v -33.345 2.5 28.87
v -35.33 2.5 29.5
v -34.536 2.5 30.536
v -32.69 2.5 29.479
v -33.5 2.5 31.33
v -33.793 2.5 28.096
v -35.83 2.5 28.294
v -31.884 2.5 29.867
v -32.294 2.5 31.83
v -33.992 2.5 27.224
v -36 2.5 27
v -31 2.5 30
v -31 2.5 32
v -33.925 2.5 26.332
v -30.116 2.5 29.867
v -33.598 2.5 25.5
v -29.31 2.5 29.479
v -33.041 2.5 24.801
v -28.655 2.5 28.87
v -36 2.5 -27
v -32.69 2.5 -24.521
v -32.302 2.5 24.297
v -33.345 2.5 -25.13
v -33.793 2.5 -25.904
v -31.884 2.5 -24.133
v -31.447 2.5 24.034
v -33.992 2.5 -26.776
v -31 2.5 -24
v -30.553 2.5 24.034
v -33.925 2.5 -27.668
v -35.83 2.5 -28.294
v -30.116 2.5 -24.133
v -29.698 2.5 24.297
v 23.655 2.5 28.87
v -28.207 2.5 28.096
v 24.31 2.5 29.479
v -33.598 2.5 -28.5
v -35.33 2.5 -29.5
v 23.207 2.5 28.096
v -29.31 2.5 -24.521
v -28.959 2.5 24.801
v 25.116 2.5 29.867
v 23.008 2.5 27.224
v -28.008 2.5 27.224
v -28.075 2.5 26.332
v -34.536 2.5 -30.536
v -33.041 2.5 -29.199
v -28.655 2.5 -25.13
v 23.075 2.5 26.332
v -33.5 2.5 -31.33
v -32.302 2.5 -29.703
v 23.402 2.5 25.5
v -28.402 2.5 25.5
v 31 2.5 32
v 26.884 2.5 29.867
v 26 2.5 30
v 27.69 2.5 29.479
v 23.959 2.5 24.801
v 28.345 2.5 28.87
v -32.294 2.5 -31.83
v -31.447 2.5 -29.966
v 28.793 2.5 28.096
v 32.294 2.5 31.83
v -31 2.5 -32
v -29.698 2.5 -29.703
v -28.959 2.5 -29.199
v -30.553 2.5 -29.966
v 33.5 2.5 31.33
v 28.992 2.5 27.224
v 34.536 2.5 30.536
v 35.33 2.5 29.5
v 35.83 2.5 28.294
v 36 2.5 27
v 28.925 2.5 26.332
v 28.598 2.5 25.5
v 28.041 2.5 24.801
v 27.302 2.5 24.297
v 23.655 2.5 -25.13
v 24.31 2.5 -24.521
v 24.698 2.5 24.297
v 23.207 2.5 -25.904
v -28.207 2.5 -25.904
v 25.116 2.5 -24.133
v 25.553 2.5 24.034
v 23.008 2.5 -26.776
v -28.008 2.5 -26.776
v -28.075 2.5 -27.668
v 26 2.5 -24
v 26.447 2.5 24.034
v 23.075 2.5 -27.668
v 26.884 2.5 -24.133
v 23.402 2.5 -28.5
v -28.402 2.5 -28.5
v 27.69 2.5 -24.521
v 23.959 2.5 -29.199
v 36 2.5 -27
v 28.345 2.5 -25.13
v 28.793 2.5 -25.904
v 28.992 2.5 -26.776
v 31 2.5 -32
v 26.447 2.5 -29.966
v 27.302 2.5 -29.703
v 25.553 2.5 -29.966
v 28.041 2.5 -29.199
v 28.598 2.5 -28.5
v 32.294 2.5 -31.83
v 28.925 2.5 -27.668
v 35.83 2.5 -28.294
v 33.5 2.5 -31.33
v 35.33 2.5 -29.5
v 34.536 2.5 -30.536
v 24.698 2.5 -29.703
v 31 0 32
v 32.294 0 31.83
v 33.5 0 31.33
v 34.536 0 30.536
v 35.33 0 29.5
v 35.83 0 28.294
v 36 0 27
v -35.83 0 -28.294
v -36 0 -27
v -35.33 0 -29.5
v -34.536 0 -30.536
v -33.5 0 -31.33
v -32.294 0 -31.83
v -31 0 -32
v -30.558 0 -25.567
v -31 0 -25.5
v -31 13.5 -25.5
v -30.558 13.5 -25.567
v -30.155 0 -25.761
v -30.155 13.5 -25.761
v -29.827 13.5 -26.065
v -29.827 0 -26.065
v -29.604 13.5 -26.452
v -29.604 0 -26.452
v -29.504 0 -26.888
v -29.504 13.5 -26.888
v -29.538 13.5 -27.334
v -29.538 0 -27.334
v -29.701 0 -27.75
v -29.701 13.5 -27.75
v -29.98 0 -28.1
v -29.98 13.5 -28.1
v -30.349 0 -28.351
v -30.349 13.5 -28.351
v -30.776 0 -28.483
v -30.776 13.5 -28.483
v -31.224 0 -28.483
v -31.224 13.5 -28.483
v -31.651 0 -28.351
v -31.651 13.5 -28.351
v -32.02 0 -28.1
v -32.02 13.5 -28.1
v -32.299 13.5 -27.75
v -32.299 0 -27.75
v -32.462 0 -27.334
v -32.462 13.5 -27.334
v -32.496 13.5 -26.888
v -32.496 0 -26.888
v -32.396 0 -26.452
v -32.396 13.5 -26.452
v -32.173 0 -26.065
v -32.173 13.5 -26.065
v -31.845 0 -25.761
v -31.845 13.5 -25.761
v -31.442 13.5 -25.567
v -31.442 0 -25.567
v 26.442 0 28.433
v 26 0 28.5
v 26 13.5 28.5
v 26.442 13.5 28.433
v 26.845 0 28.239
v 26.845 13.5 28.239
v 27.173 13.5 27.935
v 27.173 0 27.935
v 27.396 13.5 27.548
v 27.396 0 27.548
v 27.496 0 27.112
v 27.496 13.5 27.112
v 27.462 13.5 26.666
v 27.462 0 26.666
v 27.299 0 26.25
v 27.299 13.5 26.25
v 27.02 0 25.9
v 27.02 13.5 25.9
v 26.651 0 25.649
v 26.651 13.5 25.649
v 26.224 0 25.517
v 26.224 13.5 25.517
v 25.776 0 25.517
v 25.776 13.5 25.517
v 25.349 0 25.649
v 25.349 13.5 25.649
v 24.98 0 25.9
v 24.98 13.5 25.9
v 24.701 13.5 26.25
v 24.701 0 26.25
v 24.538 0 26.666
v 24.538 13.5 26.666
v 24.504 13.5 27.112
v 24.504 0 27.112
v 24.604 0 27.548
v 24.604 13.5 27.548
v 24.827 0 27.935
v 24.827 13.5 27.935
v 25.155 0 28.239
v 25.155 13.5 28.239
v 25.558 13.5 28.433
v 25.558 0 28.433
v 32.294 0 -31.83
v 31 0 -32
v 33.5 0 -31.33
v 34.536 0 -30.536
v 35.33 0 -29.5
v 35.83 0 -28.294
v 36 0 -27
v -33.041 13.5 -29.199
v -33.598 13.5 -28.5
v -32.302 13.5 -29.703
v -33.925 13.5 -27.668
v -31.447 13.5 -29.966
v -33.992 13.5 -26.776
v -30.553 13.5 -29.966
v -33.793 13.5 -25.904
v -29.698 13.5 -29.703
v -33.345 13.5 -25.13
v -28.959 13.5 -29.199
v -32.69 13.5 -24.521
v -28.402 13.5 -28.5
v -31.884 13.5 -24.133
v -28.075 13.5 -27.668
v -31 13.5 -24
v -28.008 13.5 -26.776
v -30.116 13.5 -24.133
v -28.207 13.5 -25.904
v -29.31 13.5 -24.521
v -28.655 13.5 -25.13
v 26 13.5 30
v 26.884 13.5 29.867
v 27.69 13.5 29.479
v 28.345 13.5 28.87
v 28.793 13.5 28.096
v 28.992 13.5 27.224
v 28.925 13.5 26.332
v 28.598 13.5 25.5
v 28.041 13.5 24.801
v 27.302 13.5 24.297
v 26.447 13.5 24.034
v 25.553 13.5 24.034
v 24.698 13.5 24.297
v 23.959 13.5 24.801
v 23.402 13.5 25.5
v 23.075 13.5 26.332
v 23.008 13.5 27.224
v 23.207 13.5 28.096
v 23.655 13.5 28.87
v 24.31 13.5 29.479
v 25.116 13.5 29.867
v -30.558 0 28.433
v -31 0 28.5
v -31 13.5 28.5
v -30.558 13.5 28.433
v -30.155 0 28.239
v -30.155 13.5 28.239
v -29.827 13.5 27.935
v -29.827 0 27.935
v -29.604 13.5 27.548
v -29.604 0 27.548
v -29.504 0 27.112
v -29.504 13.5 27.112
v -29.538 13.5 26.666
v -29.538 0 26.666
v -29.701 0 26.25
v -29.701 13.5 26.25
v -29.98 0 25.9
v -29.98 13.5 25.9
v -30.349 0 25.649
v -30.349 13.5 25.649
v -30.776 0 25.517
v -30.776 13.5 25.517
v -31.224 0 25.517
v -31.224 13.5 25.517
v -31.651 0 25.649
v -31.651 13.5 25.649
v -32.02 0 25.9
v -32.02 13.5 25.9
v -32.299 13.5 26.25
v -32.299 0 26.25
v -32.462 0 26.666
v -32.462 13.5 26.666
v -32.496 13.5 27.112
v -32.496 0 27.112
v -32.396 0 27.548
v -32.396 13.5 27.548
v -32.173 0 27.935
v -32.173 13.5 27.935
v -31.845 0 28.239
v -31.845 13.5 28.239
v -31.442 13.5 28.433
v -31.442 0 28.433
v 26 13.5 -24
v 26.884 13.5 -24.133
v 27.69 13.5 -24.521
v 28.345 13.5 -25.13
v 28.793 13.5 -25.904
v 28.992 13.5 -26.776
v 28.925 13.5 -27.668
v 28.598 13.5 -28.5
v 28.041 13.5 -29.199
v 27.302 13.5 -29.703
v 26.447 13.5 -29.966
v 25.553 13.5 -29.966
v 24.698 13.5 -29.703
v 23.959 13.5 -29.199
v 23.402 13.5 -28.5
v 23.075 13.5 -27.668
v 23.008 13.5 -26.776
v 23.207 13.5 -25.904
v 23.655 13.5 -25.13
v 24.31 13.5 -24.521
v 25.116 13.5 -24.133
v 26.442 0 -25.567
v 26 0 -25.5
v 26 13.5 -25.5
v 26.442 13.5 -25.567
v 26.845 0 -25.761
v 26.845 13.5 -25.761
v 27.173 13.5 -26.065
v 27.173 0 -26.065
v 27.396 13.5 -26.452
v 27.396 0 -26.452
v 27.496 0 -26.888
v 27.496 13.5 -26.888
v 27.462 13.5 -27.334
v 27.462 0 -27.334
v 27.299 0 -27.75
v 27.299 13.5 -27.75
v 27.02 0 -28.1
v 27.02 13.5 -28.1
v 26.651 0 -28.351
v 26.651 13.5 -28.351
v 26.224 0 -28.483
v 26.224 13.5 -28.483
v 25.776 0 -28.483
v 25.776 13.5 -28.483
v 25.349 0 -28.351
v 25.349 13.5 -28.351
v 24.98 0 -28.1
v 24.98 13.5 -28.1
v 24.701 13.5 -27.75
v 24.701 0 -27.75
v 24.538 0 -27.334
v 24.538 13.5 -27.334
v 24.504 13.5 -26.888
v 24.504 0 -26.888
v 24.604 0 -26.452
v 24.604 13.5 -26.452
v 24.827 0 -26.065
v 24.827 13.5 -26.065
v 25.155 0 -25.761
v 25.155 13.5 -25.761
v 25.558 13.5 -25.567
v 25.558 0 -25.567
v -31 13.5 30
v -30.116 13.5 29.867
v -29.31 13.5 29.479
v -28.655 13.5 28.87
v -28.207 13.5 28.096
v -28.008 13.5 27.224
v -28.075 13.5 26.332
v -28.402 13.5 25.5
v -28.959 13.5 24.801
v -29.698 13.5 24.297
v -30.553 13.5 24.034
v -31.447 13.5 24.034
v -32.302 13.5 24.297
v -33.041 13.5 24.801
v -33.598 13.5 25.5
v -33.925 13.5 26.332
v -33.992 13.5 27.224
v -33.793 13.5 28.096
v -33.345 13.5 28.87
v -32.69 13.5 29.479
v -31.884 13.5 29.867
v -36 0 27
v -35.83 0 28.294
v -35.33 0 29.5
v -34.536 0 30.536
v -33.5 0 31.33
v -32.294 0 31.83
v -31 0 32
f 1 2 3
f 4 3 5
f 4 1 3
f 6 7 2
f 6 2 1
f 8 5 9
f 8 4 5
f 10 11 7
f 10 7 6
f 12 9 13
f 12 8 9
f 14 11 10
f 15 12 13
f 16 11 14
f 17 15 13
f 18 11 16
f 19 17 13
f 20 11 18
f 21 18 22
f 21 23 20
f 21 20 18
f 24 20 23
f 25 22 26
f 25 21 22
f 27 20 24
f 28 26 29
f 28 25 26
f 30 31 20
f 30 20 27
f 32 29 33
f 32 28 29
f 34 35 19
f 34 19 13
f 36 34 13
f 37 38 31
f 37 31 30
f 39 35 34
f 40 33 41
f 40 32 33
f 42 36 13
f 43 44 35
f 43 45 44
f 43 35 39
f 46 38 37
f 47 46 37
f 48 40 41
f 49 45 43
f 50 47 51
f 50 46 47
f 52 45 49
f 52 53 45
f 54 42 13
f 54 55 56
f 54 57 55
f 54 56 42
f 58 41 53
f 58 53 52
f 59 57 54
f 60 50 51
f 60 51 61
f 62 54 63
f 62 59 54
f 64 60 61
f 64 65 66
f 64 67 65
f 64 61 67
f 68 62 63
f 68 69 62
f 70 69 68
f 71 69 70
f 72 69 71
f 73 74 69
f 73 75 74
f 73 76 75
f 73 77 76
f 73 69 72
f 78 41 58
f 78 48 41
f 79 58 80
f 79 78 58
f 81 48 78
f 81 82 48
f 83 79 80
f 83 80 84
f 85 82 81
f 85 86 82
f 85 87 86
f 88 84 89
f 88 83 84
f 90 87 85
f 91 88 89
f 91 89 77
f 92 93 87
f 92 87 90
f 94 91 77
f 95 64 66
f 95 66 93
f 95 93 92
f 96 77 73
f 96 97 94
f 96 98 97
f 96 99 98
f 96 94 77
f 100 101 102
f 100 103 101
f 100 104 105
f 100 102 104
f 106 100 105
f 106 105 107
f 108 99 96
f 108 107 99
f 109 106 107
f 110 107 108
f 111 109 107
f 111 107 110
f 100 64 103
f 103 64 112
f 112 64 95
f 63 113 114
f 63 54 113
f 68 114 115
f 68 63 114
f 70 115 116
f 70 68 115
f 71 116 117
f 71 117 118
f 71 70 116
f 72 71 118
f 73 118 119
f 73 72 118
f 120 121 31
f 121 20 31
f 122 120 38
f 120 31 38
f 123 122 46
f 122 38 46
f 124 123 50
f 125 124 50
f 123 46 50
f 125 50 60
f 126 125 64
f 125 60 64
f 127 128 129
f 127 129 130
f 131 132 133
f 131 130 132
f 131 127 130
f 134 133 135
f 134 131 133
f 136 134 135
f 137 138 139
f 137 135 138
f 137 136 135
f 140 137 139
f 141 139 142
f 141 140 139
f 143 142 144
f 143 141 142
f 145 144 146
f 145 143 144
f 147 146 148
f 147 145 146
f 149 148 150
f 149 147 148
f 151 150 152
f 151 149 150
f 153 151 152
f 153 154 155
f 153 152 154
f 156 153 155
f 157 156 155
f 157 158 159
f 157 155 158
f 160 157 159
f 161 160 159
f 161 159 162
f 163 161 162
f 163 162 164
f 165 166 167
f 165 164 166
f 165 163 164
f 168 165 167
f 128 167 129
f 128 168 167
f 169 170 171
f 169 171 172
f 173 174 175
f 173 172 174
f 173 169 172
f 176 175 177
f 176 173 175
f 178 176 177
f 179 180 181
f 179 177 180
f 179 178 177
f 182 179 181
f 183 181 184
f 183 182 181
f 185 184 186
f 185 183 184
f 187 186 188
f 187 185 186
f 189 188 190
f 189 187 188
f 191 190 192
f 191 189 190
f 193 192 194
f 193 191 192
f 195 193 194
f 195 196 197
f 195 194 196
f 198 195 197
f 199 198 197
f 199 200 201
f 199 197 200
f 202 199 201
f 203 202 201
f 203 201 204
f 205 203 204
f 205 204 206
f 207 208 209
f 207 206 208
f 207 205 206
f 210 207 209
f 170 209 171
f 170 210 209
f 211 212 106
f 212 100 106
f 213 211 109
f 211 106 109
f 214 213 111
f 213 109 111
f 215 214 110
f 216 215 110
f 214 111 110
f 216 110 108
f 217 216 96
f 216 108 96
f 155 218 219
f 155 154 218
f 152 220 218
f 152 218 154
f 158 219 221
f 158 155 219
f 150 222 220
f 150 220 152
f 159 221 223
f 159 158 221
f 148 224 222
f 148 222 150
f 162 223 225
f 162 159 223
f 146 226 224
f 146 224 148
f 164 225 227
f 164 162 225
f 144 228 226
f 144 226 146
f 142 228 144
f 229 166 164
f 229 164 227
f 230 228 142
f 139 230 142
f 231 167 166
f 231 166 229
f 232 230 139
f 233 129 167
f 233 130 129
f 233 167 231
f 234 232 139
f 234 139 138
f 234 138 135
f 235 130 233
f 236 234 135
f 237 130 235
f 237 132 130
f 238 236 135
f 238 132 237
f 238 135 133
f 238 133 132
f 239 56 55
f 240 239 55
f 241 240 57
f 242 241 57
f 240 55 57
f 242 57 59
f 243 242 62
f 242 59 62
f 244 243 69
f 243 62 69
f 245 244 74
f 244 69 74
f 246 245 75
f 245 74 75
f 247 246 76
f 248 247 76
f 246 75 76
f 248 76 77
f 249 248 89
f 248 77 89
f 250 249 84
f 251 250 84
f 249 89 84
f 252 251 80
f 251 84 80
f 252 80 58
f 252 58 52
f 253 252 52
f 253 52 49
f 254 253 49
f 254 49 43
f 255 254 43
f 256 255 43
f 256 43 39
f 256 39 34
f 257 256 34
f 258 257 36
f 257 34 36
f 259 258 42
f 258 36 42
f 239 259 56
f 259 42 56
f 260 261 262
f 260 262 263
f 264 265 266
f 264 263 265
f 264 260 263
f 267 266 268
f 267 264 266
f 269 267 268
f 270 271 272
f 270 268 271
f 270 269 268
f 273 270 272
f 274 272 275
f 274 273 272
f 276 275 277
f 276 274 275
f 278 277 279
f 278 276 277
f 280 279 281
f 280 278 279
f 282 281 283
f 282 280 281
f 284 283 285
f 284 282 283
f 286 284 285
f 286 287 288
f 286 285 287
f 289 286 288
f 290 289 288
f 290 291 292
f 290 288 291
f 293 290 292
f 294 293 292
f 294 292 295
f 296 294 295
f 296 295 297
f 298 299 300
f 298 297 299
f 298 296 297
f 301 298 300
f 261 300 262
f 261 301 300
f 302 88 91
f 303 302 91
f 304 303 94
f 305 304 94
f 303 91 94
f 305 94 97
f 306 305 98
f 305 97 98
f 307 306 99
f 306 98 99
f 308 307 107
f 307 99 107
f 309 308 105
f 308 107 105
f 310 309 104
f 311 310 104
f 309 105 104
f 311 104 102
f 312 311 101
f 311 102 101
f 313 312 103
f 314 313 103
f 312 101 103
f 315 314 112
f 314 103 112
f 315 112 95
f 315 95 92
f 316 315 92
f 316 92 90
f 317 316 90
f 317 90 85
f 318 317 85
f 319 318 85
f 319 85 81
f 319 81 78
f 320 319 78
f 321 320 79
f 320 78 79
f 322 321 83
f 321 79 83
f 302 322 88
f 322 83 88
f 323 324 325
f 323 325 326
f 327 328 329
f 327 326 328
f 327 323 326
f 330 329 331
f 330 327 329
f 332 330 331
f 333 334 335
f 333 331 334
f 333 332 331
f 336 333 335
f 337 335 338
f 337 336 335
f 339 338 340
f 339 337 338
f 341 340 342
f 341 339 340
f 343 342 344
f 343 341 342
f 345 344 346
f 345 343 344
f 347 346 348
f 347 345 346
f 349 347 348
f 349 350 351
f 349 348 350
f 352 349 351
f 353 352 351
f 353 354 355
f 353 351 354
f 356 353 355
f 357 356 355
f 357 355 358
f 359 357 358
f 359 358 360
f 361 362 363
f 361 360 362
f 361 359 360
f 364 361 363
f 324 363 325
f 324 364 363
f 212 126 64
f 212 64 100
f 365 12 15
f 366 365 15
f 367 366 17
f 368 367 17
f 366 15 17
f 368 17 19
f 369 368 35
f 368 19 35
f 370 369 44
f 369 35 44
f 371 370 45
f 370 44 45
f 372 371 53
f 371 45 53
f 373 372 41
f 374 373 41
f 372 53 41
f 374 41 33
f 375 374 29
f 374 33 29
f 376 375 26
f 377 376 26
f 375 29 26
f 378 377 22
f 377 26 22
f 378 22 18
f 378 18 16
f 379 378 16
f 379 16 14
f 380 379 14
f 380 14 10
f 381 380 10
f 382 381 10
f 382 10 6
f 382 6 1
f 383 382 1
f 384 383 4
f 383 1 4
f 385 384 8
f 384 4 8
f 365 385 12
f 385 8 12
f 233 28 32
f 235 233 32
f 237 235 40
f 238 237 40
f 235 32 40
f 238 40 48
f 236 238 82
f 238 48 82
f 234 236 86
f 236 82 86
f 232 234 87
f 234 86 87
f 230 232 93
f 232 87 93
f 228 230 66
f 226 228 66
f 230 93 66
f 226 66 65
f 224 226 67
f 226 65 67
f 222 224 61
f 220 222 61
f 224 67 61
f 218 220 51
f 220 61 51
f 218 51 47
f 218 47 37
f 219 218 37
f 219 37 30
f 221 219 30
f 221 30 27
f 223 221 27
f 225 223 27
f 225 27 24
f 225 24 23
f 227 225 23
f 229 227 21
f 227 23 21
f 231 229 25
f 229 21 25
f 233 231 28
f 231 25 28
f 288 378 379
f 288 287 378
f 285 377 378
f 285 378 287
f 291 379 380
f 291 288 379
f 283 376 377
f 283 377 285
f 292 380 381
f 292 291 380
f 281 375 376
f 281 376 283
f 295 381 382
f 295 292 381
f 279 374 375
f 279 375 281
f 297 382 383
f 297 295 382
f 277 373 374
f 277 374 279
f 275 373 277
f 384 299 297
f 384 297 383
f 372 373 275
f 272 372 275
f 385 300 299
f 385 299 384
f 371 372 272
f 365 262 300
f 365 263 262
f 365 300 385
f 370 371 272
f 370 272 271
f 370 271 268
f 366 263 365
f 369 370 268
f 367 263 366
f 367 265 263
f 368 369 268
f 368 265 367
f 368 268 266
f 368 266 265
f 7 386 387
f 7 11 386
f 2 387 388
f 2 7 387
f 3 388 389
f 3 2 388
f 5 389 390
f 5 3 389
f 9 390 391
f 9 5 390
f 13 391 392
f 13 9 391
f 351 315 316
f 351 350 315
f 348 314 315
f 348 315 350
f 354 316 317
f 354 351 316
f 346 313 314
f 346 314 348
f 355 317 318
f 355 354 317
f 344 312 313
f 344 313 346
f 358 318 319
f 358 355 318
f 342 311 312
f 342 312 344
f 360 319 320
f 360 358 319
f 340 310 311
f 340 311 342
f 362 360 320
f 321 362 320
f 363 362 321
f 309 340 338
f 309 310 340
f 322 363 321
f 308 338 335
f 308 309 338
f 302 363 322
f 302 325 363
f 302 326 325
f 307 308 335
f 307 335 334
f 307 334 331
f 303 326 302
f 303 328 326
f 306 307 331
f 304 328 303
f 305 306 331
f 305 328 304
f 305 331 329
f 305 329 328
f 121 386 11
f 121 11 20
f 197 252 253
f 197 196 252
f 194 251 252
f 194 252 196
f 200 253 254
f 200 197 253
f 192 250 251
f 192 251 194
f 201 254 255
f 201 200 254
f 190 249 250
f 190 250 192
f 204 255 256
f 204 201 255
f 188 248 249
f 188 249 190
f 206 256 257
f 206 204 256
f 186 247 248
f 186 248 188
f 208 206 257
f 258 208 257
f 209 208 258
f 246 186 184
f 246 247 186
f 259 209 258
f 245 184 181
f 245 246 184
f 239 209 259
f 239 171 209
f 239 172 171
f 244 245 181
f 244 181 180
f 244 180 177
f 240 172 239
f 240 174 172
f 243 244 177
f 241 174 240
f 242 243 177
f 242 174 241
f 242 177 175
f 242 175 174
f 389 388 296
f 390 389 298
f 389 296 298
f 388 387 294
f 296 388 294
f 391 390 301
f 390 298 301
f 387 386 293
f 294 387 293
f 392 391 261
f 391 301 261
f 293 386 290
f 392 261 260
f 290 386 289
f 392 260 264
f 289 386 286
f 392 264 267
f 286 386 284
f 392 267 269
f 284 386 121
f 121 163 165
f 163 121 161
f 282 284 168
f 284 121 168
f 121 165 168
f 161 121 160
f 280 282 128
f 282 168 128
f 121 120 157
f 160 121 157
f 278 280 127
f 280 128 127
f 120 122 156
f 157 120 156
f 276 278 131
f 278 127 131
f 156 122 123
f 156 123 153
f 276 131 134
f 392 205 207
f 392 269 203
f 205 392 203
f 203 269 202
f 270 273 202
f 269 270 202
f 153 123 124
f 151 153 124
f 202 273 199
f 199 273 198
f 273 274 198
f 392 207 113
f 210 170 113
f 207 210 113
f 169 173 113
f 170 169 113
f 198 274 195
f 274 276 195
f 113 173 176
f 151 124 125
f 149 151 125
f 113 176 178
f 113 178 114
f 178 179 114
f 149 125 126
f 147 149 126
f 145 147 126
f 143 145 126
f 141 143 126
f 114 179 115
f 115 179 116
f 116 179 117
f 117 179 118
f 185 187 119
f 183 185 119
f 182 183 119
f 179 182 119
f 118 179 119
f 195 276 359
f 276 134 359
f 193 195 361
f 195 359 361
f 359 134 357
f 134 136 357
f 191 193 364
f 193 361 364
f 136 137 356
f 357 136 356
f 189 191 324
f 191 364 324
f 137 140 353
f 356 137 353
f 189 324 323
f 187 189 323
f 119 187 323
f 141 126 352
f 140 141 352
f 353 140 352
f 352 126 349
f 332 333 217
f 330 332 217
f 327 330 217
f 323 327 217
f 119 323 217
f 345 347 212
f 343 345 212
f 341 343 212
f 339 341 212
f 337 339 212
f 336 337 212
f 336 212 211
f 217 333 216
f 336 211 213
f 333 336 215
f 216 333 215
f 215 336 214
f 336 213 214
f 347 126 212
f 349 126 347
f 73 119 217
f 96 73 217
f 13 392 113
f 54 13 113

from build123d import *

# Parameters (mm, degrees)
SKETCH1_W               = 72
SKETCH1_H               = 64
BOSS_EXTRUDE1_DEPTH     = 2.5
SKETCH2_R               = 3
BOSS_EXTRUDE2_DEPTH     = 11
CUT_EXTRUDE1_DEPTH      = 51.02249494
CUT_EXTRUDE1_DEPTH_BACK = 51.02249494
SKETCH3_R               = 1.5
FILLET1_R               = 5


with BuildPart() as part:
    # Sketch1 → Boss-Extrude1 (new body)
    with BuildSketch(Plane(origin=(0, 0, 0), x_dir=(1, 0, 0), z_dir=(0, 1, 0))):
        Rectangle(SKETCH1_W, SKETCH1_H)
    extrude(amount=BOSS_EXTRUDE1_DEPTH)

    # Sketch2 → Boss-Extrude2 (add)
    with BuildSketch(Plane(origin=(0, 2.5, 0), x_dir=(1, 0, 0), z_dir=(0, 1, 0))):
        with Locations(Location((-31, 27, 0), (0, 0, 270))):
            Circle(SKETCH2_R)
        with Locations(Location((26, 27, 0), (0, 0, 270))):
            Circle(SKETCH2_R)
        with Locations(Location((-31, -27, 0), (0, 0, 270))):
            Circle(SKETCH2_R)
        with Locations(Location((26, -27, 0), (0, 0, 270))):
            Circle(SKETCH2_R)
    extrude(amount=BOSS_EXTRUDE2_DEPTH)

    # Sketch3 → Cut-Extrude1 (cut, two sides: drawn at the far end of the back side and taken through both)
    with BuildSketch(Plane(origin=(0, 13.5, 0), x_dir=(1, 0, 0), z_dir=(0, 1, 0)).offset(-CUT_EXTRUDE1_DEPTH_BACK)):
        with Locations(Location((-31, 27, 0), (0, 0, 270))):
            Circle(SKETCH3_R)
        with Locations(Location((-31, -27, 0), (0, 0, 270))):
            Circle(SKETCH3_R)
        with Locations(Location((26, 27, 0), (0, 0, 270))):
            Circle(SKETCH3_R)
        with Locations(Location((26, -27, 0), (0, 0, 270))):
            Circle(SKETCH3_R)
    extrude(amount=CUT_EXTRUDE1_DEPTH + CUT_EXTRUDE1_DEPTH_BACK, mode=Mode.SUBTRACT)

    # Fillet1
    fillet1_edges = [part.edges().sort_by_distance(p)[0] for p in [
        (-36, 1.25, -32),
        (36, 1.25, -32),
        (36, 1.25, 32),
        (-36, 1.25, 32),
    ]]
    fillet(fillet1_edges, radius=FILLET1_R)


solid = part.part
